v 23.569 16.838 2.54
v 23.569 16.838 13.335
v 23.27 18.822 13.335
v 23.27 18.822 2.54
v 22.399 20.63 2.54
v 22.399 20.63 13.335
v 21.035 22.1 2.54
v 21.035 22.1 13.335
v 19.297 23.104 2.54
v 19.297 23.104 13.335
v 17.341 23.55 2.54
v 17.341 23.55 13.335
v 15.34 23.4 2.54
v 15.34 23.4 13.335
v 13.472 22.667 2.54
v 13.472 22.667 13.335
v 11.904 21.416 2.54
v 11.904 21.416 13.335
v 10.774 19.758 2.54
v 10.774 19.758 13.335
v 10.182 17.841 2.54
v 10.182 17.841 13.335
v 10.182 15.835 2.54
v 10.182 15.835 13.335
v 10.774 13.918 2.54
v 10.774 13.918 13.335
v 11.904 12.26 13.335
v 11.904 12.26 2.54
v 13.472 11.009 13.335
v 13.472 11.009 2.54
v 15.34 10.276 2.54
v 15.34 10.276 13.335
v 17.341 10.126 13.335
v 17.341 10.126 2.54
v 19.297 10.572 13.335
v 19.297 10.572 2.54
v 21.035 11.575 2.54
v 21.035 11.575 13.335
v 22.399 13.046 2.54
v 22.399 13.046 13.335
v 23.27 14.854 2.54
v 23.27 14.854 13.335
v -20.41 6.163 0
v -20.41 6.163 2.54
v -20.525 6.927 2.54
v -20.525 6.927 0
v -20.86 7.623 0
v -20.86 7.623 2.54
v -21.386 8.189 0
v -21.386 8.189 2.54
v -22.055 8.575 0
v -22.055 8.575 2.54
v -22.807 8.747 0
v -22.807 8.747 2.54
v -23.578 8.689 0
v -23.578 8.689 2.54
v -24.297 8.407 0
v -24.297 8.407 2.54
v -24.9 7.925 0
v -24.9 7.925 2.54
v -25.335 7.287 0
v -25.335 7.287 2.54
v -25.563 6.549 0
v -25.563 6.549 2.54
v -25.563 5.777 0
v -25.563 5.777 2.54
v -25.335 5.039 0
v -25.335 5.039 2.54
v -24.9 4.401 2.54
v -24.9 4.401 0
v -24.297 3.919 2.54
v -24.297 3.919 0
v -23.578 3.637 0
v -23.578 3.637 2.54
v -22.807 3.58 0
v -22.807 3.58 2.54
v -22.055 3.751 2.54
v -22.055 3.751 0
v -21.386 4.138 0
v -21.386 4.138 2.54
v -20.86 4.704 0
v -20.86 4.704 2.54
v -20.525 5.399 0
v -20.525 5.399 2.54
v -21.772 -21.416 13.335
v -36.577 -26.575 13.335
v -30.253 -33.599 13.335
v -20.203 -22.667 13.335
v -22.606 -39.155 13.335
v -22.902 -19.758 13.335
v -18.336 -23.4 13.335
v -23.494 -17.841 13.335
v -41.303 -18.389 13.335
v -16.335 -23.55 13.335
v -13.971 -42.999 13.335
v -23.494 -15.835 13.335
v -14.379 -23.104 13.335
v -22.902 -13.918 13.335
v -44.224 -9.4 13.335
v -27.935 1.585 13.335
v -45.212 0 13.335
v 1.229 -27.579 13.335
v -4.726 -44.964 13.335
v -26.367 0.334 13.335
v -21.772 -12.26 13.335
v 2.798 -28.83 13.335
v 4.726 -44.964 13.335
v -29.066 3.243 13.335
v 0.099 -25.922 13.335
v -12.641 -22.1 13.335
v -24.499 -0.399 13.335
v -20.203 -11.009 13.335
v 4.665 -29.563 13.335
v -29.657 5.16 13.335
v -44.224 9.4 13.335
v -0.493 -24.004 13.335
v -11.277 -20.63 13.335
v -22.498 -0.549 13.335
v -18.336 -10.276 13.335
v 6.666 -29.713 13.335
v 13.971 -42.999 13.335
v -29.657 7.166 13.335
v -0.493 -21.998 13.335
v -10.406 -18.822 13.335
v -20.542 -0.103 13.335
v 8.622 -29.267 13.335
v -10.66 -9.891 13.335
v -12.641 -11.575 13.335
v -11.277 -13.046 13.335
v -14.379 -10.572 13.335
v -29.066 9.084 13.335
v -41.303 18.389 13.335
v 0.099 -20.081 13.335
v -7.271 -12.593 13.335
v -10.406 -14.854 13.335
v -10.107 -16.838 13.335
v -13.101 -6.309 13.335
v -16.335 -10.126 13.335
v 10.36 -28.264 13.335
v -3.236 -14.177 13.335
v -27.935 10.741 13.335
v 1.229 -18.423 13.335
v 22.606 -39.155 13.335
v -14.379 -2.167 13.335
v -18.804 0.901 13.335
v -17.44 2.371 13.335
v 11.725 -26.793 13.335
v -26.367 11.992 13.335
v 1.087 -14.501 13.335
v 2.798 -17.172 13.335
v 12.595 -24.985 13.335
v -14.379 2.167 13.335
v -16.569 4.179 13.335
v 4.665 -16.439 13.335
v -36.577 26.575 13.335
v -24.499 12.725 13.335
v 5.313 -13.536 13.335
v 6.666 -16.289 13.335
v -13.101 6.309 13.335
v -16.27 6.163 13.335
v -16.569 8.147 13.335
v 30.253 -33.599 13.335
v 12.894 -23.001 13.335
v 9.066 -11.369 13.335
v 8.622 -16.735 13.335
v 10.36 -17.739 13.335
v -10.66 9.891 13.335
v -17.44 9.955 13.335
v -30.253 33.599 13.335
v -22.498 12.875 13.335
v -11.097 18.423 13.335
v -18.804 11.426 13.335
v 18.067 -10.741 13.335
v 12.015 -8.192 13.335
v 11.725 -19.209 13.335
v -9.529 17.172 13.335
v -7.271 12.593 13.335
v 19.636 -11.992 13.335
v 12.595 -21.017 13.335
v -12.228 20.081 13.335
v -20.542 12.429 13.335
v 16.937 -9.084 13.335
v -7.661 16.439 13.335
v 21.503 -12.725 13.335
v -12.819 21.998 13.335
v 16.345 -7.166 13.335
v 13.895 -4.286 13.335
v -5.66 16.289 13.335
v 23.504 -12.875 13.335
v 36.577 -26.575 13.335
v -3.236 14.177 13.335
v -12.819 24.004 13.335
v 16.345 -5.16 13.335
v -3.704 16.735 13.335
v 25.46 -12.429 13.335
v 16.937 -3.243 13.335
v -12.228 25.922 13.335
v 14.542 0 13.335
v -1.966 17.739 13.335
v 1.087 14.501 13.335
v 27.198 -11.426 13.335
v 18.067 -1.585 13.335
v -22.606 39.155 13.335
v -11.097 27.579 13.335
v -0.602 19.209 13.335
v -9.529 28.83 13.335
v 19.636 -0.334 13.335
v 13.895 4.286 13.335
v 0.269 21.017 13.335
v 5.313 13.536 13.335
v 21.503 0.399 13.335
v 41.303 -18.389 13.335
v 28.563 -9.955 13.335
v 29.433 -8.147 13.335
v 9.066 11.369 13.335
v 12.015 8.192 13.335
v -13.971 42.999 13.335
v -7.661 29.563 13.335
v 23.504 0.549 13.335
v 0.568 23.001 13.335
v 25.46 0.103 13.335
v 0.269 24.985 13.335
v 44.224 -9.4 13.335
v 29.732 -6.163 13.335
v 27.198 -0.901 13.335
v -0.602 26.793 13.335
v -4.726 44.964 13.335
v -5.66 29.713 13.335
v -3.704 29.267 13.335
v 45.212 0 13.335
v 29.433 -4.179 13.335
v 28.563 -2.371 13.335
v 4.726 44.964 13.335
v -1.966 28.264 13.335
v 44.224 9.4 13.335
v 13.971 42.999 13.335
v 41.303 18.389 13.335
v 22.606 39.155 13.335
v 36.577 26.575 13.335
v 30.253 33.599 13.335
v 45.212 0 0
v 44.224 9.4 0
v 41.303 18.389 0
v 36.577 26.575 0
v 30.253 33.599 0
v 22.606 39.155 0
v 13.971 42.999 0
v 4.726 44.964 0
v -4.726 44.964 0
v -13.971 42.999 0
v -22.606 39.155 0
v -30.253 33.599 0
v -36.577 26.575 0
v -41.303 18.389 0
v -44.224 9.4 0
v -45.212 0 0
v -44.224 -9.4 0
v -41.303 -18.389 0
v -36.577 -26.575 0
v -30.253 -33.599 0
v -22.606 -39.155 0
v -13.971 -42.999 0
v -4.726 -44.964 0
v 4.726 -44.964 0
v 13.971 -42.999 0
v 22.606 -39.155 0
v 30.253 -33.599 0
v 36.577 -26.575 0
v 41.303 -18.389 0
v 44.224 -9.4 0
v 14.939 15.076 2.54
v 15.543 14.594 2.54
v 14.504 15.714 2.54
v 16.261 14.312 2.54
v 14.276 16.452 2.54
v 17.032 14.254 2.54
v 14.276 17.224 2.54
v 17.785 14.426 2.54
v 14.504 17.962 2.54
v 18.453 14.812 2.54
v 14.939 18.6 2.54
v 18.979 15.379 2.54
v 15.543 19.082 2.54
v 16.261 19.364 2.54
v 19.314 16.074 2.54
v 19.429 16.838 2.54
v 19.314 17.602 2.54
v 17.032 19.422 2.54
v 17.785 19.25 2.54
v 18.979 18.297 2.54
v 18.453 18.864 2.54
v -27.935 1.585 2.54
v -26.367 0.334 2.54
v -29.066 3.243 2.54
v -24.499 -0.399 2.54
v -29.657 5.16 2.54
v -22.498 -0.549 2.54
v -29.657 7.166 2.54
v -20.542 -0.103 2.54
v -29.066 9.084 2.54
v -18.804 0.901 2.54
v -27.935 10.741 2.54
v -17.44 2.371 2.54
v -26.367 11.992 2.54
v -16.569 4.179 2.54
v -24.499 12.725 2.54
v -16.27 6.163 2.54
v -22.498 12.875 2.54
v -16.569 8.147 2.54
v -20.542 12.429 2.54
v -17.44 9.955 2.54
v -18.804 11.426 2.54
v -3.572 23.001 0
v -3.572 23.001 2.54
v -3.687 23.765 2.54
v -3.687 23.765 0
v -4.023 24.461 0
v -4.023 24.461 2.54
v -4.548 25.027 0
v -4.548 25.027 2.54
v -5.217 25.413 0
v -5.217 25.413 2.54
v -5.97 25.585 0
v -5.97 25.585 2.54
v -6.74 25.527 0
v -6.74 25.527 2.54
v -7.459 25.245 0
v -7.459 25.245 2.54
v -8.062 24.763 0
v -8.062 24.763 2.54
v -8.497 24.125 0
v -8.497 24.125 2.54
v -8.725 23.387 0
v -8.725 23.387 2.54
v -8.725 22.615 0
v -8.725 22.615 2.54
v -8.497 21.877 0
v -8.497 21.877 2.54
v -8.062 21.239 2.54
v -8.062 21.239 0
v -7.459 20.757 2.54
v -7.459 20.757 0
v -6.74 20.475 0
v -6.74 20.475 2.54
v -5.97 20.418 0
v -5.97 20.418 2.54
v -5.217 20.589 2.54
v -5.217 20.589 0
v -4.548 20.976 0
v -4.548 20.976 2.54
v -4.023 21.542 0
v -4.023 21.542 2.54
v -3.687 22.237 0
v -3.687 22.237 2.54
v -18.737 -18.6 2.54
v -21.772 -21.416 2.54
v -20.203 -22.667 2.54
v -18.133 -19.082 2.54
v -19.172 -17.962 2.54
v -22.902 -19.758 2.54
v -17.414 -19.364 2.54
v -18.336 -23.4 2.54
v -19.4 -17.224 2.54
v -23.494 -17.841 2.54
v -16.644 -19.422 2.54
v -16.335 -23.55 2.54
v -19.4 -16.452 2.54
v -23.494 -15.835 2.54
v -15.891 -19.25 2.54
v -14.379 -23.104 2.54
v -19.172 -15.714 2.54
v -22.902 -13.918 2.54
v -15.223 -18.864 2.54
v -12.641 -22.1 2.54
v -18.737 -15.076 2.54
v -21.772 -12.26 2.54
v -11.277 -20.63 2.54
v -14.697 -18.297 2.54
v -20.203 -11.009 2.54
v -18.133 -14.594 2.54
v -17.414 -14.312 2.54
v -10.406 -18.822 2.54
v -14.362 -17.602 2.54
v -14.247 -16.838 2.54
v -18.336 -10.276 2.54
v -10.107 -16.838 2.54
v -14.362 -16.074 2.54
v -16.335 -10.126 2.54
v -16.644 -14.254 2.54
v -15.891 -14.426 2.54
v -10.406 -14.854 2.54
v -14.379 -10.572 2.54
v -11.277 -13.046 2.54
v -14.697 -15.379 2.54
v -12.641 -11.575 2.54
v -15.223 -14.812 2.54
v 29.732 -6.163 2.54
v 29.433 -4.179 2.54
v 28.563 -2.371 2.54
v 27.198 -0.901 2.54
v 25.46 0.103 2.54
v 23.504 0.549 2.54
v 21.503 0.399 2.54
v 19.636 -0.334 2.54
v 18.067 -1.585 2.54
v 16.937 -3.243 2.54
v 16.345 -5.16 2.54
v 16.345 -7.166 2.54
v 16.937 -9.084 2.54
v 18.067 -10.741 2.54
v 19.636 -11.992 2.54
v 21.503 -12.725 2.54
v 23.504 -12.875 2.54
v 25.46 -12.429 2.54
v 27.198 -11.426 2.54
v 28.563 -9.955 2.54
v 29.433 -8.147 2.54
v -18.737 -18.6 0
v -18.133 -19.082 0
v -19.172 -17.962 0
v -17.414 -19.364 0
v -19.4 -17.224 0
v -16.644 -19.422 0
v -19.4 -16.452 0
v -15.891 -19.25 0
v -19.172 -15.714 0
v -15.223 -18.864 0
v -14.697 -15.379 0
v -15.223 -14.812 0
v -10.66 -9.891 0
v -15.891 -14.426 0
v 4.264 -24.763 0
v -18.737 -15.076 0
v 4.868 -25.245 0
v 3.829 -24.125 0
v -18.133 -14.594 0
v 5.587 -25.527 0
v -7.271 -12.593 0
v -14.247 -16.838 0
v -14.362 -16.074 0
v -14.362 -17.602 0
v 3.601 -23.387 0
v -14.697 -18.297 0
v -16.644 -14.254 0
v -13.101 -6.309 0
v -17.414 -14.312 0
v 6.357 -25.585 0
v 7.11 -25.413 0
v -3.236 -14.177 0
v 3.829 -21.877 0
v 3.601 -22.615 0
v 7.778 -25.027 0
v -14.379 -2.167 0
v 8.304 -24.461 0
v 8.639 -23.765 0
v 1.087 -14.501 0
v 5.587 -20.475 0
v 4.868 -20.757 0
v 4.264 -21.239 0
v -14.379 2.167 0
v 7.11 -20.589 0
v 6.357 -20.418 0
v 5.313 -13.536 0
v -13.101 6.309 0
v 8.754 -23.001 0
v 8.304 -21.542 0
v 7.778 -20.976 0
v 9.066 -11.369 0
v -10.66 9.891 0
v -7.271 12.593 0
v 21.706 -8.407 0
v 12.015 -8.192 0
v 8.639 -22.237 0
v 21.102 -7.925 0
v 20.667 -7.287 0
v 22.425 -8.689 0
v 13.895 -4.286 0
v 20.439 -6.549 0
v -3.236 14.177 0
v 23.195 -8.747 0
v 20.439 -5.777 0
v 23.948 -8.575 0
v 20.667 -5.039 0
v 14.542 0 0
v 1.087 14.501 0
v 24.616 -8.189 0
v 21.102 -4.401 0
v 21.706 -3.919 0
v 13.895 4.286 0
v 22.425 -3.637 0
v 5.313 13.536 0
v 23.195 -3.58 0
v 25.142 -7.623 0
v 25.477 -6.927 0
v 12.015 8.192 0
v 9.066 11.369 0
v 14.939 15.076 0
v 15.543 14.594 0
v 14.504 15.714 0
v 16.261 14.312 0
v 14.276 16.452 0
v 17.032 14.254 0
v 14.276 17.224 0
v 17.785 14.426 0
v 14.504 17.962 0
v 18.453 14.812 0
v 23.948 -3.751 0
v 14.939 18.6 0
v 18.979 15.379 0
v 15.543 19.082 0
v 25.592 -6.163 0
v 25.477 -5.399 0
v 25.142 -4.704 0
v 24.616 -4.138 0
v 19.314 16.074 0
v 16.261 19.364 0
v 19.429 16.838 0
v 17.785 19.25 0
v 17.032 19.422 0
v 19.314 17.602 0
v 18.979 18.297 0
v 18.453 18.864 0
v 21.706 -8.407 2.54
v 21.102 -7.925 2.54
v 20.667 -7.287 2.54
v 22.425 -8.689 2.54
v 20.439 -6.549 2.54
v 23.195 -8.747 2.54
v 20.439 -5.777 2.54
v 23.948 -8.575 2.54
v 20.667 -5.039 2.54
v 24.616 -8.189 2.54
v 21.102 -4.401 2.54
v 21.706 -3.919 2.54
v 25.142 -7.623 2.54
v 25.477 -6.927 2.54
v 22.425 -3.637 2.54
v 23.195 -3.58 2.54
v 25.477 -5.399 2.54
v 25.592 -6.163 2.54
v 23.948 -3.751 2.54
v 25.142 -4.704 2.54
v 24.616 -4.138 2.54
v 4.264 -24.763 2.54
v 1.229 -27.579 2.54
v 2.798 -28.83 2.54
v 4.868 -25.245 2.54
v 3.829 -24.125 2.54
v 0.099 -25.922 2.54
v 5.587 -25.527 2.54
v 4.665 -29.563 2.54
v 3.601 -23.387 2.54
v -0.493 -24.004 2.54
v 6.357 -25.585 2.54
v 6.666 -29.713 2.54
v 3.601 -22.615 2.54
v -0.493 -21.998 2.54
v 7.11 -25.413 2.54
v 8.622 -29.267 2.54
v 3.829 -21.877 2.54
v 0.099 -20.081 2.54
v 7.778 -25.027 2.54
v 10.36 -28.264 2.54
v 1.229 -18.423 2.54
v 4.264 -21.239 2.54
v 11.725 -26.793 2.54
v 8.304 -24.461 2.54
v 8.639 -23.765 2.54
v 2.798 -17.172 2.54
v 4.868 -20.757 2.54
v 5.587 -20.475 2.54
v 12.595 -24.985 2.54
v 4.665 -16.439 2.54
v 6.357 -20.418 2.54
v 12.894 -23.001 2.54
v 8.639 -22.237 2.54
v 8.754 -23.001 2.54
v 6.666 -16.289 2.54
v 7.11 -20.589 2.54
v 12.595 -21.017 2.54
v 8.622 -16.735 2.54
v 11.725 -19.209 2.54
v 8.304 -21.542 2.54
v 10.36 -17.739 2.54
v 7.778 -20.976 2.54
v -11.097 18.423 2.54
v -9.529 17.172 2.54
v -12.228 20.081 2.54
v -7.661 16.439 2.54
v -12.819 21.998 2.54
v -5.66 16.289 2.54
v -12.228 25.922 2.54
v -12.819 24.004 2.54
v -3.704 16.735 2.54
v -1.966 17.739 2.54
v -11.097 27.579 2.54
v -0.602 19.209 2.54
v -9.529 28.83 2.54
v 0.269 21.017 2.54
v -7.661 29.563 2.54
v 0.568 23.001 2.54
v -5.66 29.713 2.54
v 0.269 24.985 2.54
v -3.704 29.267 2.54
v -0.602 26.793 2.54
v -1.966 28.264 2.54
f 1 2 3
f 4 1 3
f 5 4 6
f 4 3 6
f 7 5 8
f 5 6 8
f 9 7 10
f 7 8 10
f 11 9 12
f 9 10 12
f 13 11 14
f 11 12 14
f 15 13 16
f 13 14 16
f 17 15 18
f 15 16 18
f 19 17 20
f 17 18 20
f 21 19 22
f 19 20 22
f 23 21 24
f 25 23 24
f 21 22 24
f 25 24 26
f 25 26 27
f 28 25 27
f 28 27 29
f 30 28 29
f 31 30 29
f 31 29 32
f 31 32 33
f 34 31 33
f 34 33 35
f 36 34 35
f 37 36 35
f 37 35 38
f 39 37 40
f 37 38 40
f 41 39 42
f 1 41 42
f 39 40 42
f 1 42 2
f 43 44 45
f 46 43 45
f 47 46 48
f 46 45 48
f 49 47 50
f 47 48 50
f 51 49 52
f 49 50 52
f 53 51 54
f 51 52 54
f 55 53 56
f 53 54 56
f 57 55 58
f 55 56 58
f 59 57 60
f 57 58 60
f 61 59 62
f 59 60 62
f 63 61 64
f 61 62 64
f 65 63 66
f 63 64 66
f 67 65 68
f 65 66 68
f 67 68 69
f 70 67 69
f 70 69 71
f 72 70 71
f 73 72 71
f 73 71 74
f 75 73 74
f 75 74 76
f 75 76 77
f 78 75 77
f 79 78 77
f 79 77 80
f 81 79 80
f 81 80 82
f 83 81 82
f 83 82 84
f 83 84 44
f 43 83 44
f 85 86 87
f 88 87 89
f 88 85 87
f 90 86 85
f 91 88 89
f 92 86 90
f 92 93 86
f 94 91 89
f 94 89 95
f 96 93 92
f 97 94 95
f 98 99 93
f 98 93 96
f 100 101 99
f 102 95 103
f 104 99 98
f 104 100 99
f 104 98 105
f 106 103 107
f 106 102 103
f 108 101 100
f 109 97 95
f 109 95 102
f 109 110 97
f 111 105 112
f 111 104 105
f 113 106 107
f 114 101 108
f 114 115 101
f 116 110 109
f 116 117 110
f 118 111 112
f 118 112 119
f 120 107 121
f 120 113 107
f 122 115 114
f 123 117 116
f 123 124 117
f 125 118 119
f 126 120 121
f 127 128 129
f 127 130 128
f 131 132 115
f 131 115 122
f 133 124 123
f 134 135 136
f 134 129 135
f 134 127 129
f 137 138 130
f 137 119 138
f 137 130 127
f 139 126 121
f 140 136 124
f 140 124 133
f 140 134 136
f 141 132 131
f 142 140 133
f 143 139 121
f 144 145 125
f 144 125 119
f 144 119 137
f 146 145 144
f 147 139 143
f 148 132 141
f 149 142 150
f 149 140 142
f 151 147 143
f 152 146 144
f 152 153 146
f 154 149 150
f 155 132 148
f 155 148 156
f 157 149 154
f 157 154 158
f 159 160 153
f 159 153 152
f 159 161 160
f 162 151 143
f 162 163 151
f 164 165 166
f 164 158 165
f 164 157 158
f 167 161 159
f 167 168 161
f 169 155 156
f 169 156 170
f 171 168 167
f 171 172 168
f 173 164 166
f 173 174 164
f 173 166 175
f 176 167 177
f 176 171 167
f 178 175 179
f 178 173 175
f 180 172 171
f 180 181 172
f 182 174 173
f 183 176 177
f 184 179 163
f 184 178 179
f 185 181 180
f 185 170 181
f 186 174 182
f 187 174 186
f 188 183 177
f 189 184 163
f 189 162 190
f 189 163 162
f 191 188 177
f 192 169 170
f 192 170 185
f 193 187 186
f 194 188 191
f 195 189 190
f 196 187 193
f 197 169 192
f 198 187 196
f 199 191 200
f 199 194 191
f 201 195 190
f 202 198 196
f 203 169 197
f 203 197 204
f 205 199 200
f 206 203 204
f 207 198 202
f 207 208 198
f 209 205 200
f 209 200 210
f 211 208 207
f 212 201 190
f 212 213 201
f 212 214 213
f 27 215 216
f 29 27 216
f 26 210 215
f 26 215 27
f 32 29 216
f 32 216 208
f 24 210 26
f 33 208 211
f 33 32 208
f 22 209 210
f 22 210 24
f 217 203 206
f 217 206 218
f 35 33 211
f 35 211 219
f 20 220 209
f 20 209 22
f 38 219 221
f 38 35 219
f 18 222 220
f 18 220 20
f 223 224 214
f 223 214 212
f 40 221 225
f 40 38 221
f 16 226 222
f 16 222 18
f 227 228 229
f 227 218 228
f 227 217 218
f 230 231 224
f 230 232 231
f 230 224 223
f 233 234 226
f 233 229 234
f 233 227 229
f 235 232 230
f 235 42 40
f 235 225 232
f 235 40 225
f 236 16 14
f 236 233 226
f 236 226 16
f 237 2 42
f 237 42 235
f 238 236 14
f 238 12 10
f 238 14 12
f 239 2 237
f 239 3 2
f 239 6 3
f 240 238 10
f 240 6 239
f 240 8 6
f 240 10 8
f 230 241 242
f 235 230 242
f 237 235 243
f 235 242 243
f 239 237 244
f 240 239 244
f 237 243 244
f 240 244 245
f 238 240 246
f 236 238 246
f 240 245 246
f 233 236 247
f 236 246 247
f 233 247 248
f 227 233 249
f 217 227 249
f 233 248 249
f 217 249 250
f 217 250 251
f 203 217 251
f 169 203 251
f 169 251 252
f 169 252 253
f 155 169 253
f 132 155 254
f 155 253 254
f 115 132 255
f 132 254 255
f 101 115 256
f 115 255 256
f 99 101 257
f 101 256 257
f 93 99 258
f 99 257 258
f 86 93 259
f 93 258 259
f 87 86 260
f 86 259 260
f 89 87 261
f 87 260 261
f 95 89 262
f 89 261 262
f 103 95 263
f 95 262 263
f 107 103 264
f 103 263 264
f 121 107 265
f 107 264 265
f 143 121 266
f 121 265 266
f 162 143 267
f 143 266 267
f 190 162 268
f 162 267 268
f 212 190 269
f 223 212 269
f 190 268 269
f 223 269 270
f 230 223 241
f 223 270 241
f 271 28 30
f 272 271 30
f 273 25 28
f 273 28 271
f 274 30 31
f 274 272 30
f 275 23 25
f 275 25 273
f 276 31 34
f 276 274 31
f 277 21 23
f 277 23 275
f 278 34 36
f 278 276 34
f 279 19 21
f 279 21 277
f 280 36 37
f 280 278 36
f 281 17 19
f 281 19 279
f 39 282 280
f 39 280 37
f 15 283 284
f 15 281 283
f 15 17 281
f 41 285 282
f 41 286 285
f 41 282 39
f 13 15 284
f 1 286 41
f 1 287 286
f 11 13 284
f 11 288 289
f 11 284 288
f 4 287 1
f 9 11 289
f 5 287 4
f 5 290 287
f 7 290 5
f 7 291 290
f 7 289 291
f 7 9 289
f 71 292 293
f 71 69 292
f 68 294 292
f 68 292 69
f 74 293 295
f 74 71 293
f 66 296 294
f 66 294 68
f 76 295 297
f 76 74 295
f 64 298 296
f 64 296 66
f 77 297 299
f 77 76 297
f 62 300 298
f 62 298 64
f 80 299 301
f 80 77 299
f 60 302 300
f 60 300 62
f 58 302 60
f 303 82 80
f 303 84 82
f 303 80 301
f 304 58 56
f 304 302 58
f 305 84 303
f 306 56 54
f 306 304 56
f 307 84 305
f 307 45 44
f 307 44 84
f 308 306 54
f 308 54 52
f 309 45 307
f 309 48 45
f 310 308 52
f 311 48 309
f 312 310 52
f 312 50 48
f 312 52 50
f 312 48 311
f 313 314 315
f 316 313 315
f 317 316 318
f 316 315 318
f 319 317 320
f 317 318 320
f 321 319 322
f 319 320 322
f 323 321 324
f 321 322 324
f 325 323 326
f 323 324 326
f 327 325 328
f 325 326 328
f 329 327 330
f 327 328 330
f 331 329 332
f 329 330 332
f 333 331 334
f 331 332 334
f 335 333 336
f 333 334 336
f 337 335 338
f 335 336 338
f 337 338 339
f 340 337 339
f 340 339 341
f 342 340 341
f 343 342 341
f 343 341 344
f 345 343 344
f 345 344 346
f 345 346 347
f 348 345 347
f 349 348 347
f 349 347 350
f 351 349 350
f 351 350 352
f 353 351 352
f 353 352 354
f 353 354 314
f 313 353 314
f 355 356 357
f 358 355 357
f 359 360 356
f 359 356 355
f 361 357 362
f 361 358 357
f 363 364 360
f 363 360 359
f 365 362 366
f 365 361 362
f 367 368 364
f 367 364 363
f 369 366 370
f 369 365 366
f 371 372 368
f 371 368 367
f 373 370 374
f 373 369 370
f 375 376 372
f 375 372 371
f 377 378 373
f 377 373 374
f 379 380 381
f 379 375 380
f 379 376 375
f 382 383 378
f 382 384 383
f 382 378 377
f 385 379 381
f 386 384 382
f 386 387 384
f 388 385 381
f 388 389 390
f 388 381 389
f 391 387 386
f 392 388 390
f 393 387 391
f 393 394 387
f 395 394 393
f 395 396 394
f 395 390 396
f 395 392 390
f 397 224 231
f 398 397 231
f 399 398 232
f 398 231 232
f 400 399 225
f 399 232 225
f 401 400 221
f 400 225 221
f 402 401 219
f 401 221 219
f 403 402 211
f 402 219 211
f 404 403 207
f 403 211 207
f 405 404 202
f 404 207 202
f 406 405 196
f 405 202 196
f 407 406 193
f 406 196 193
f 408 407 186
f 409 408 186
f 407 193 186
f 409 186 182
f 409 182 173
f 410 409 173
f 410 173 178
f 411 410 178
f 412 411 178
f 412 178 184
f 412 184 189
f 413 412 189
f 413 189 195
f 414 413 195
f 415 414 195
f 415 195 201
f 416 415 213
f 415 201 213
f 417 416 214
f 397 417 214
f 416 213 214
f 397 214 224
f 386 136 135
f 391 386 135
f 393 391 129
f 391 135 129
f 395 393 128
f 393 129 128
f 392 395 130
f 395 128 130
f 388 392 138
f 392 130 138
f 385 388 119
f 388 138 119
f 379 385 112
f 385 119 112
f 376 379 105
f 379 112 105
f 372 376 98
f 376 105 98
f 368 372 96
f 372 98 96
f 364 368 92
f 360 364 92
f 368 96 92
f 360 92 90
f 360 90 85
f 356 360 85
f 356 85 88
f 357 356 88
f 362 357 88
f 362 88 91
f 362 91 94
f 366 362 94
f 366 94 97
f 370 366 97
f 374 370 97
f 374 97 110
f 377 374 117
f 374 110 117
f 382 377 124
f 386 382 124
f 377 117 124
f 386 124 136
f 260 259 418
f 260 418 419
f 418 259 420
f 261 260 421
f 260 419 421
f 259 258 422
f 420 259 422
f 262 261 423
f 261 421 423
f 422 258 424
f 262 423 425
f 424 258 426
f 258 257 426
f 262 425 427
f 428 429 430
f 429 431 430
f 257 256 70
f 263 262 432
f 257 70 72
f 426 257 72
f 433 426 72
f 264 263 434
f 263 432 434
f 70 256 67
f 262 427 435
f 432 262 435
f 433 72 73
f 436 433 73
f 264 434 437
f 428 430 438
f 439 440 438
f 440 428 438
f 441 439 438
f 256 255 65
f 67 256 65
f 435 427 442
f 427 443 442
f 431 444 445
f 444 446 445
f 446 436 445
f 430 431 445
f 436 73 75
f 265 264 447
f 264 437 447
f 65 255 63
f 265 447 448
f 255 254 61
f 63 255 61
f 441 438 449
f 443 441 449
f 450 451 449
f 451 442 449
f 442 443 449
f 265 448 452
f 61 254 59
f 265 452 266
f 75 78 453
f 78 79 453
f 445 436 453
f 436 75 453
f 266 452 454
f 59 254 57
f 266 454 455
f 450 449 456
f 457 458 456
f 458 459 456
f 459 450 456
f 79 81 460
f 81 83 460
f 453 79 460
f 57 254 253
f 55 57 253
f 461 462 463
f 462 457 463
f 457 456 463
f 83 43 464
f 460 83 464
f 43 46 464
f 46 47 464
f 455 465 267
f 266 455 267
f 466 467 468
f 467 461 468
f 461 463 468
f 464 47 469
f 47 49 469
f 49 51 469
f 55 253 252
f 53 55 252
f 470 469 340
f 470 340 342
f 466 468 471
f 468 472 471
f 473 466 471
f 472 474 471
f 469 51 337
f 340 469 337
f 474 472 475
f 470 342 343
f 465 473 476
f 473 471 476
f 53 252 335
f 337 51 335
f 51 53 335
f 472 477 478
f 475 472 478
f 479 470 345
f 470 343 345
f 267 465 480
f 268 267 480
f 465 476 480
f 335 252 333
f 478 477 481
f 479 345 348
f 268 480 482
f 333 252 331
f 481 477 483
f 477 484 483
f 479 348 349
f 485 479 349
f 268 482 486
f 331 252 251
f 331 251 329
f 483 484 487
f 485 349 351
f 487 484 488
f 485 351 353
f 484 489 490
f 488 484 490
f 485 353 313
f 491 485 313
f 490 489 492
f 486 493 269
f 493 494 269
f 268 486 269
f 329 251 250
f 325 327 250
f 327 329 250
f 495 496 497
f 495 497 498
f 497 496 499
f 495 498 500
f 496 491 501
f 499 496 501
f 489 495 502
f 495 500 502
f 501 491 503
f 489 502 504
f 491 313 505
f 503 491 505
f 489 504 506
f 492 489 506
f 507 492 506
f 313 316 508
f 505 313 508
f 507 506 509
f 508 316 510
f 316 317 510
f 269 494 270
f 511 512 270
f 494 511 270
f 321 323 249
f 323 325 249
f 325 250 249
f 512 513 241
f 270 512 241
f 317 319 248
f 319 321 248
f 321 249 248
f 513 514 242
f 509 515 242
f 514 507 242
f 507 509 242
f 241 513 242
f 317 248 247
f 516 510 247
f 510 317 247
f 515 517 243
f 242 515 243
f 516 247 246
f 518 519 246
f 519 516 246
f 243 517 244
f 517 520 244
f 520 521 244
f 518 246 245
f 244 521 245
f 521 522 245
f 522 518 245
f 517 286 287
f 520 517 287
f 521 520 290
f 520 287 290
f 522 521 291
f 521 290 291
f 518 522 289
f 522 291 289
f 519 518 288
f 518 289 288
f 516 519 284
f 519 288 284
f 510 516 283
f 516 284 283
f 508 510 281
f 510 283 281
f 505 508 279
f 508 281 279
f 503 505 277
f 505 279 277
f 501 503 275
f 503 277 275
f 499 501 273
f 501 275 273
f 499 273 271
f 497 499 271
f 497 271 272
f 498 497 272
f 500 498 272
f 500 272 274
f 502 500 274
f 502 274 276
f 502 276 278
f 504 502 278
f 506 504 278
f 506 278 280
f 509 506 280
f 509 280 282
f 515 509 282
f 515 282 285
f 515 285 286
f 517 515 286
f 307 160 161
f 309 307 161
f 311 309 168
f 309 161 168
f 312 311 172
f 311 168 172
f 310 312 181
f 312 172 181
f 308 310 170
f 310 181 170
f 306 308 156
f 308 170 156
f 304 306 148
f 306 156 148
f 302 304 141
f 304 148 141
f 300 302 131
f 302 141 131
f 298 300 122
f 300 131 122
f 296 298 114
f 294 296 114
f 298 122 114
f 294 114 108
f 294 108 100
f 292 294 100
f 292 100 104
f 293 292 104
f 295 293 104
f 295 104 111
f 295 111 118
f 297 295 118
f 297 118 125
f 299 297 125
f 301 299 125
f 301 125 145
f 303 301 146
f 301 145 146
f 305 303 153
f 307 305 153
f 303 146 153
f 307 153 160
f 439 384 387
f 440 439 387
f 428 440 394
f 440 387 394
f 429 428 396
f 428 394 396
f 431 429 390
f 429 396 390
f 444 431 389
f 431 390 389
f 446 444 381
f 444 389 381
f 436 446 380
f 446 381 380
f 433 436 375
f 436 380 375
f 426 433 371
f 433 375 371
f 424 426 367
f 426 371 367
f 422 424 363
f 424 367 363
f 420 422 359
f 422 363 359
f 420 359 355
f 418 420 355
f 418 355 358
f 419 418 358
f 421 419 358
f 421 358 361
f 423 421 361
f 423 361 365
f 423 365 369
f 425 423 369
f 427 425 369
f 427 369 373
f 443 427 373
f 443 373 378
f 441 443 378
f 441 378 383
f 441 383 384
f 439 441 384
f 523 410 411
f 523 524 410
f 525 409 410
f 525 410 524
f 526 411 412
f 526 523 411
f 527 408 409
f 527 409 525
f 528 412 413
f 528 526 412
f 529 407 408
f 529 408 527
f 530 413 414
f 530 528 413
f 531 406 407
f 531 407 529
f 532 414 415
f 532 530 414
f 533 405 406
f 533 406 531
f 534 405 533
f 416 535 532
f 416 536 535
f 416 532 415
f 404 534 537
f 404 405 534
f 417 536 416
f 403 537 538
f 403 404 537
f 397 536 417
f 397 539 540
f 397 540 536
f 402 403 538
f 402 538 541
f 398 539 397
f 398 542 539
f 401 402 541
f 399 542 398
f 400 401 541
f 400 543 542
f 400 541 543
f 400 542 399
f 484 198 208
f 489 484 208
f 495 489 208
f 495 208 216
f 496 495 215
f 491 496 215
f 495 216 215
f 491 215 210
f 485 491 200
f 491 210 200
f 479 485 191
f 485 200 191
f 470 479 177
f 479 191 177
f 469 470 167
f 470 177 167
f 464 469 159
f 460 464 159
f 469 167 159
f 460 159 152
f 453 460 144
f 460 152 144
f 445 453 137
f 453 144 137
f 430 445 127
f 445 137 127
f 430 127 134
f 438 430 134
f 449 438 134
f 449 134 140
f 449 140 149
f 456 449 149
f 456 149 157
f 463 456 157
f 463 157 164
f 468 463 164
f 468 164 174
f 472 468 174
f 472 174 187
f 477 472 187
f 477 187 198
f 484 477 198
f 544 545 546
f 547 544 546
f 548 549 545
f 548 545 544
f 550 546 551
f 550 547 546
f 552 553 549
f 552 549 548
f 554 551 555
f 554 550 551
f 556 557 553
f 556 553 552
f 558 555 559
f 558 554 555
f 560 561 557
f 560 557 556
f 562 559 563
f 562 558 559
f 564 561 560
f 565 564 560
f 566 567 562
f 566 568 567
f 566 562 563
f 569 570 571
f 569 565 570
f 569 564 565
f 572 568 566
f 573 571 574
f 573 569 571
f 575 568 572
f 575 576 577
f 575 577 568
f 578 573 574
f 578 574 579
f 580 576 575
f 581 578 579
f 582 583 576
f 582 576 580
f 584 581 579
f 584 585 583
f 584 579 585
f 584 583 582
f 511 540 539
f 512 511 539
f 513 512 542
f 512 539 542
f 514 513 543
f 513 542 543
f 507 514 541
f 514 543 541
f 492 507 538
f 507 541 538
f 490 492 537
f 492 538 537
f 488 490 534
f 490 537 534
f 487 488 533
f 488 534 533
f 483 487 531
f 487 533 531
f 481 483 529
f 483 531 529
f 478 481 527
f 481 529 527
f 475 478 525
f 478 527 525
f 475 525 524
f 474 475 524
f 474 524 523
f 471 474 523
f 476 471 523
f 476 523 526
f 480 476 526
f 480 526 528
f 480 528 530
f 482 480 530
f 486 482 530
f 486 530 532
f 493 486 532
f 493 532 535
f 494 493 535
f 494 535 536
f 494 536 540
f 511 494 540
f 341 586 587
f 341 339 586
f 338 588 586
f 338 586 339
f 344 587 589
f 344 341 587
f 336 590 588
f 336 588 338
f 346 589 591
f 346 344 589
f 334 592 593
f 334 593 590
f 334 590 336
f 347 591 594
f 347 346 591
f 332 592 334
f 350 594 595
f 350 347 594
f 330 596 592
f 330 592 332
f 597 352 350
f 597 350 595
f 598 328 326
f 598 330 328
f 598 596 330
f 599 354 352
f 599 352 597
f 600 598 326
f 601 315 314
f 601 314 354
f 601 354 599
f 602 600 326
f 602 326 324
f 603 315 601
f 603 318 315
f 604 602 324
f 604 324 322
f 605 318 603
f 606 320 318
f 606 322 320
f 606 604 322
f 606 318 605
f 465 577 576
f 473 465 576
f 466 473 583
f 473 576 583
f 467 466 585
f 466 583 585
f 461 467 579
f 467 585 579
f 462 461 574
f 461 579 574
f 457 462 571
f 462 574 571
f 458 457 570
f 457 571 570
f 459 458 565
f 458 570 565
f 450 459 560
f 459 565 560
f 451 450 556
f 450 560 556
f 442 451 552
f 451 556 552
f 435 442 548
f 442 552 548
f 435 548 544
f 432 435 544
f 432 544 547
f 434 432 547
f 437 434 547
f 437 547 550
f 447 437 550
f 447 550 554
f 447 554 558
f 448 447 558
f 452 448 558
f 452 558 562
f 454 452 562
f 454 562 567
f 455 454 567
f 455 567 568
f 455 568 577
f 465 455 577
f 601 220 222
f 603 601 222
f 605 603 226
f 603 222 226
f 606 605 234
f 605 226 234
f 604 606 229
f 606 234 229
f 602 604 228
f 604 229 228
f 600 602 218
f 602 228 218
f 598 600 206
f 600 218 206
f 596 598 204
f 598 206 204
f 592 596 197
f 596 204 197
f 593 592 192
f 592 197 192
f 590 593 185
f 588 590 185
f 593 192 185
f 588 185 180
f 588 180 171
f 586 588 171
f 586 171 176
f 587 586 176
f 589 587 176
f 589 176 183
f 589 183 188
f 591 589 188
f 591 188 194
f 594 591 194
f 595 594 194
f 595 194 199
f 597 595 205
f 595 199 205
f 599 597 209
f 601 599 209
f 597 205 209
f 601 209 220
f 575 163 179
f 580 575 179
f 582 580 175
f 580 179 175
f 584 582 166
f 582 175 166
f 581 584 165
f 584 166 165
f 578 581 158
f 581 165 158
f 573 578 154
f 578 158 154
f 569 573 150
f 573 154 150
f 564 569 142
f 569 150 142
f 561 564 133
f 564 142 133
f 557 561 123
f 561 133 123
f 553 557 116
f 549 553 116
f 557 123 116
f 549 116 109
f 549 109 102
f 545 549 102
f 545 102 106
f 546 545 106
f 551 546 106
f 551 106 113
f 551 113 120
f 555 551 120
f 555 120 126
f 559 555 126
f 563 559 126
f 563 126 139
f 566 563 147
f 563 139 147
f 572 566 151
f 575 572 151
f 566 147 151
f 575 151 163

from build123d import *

# Parameters (mm, degrees)
F0_R     = 45.212
F1_DEPTH = 13.335
F2_R     = 2.5908
F3_DEPTH = 25.4
F4_R     = 14.5415
F5_DEPTH = 25.4
F6_R     = 6.731
F7_DEPTH = 10.795


with BuildPart() as f1:
    # F0 (on Top) → F1 (new body)
    with BuildSketch(Plane.XY):
        Circle(F0_R)
    extrude(amount=F1_DEPTH)

    # F2 (on face) → F3 (cut)
    with BuildSketch(Plane.XY.offset(13.335)):
        with Locations((-6.163129, 23.001109)):
            Circle(F2_R)
        with Locations((-23.001109, 6.163129)):
            Circle(F2_R)
        with Locations((-16.83798, -16.83798)):
            Circle(F2_R)
        with Locations((6.163129, -23.001109)):
            Circle(F2_R)
        with Locations((23.001109, -6.163129)):
            Circle(F2_R)
        with Locations((16.83798, 16.83798)):
            Circle(F2_R)
    extrude(amount=-F3_DEPTH, mode=Mode.SUBTRACT)

    # F4 (on face) → F5 (cut)
    with BuildSketch(Plane.XY.offset(13.335)):
        Circle(F4_R)
    extrude(amount=-F5_DEPTH, mode=Mode.SUBTRACT)

    # F6 (on face) → F7 (cut)
    with BuildSketch(Plane.XY.offset(13.335)):
        with Locations((-6.163129, 23.001109)):
            Circle(F6_R)
        with Locations((16.83798, 16.83798)):
            Circle(F6_R)
        with Locations((23.001109, -6.163129)):
            Circle(F6_R)
        with Locations((6.163129, -23.001109)):
            Circle(F6_R)
        with Locations((-16.83798, -16.83798)):
            Circle(F6_R)
        with Locations((-23.001109, 6.163129)):
            Circle(F6_R)
    extrude(amount=-F7_DEPTH, mode=Mode.SUBTRACT)


solid = f1.part
